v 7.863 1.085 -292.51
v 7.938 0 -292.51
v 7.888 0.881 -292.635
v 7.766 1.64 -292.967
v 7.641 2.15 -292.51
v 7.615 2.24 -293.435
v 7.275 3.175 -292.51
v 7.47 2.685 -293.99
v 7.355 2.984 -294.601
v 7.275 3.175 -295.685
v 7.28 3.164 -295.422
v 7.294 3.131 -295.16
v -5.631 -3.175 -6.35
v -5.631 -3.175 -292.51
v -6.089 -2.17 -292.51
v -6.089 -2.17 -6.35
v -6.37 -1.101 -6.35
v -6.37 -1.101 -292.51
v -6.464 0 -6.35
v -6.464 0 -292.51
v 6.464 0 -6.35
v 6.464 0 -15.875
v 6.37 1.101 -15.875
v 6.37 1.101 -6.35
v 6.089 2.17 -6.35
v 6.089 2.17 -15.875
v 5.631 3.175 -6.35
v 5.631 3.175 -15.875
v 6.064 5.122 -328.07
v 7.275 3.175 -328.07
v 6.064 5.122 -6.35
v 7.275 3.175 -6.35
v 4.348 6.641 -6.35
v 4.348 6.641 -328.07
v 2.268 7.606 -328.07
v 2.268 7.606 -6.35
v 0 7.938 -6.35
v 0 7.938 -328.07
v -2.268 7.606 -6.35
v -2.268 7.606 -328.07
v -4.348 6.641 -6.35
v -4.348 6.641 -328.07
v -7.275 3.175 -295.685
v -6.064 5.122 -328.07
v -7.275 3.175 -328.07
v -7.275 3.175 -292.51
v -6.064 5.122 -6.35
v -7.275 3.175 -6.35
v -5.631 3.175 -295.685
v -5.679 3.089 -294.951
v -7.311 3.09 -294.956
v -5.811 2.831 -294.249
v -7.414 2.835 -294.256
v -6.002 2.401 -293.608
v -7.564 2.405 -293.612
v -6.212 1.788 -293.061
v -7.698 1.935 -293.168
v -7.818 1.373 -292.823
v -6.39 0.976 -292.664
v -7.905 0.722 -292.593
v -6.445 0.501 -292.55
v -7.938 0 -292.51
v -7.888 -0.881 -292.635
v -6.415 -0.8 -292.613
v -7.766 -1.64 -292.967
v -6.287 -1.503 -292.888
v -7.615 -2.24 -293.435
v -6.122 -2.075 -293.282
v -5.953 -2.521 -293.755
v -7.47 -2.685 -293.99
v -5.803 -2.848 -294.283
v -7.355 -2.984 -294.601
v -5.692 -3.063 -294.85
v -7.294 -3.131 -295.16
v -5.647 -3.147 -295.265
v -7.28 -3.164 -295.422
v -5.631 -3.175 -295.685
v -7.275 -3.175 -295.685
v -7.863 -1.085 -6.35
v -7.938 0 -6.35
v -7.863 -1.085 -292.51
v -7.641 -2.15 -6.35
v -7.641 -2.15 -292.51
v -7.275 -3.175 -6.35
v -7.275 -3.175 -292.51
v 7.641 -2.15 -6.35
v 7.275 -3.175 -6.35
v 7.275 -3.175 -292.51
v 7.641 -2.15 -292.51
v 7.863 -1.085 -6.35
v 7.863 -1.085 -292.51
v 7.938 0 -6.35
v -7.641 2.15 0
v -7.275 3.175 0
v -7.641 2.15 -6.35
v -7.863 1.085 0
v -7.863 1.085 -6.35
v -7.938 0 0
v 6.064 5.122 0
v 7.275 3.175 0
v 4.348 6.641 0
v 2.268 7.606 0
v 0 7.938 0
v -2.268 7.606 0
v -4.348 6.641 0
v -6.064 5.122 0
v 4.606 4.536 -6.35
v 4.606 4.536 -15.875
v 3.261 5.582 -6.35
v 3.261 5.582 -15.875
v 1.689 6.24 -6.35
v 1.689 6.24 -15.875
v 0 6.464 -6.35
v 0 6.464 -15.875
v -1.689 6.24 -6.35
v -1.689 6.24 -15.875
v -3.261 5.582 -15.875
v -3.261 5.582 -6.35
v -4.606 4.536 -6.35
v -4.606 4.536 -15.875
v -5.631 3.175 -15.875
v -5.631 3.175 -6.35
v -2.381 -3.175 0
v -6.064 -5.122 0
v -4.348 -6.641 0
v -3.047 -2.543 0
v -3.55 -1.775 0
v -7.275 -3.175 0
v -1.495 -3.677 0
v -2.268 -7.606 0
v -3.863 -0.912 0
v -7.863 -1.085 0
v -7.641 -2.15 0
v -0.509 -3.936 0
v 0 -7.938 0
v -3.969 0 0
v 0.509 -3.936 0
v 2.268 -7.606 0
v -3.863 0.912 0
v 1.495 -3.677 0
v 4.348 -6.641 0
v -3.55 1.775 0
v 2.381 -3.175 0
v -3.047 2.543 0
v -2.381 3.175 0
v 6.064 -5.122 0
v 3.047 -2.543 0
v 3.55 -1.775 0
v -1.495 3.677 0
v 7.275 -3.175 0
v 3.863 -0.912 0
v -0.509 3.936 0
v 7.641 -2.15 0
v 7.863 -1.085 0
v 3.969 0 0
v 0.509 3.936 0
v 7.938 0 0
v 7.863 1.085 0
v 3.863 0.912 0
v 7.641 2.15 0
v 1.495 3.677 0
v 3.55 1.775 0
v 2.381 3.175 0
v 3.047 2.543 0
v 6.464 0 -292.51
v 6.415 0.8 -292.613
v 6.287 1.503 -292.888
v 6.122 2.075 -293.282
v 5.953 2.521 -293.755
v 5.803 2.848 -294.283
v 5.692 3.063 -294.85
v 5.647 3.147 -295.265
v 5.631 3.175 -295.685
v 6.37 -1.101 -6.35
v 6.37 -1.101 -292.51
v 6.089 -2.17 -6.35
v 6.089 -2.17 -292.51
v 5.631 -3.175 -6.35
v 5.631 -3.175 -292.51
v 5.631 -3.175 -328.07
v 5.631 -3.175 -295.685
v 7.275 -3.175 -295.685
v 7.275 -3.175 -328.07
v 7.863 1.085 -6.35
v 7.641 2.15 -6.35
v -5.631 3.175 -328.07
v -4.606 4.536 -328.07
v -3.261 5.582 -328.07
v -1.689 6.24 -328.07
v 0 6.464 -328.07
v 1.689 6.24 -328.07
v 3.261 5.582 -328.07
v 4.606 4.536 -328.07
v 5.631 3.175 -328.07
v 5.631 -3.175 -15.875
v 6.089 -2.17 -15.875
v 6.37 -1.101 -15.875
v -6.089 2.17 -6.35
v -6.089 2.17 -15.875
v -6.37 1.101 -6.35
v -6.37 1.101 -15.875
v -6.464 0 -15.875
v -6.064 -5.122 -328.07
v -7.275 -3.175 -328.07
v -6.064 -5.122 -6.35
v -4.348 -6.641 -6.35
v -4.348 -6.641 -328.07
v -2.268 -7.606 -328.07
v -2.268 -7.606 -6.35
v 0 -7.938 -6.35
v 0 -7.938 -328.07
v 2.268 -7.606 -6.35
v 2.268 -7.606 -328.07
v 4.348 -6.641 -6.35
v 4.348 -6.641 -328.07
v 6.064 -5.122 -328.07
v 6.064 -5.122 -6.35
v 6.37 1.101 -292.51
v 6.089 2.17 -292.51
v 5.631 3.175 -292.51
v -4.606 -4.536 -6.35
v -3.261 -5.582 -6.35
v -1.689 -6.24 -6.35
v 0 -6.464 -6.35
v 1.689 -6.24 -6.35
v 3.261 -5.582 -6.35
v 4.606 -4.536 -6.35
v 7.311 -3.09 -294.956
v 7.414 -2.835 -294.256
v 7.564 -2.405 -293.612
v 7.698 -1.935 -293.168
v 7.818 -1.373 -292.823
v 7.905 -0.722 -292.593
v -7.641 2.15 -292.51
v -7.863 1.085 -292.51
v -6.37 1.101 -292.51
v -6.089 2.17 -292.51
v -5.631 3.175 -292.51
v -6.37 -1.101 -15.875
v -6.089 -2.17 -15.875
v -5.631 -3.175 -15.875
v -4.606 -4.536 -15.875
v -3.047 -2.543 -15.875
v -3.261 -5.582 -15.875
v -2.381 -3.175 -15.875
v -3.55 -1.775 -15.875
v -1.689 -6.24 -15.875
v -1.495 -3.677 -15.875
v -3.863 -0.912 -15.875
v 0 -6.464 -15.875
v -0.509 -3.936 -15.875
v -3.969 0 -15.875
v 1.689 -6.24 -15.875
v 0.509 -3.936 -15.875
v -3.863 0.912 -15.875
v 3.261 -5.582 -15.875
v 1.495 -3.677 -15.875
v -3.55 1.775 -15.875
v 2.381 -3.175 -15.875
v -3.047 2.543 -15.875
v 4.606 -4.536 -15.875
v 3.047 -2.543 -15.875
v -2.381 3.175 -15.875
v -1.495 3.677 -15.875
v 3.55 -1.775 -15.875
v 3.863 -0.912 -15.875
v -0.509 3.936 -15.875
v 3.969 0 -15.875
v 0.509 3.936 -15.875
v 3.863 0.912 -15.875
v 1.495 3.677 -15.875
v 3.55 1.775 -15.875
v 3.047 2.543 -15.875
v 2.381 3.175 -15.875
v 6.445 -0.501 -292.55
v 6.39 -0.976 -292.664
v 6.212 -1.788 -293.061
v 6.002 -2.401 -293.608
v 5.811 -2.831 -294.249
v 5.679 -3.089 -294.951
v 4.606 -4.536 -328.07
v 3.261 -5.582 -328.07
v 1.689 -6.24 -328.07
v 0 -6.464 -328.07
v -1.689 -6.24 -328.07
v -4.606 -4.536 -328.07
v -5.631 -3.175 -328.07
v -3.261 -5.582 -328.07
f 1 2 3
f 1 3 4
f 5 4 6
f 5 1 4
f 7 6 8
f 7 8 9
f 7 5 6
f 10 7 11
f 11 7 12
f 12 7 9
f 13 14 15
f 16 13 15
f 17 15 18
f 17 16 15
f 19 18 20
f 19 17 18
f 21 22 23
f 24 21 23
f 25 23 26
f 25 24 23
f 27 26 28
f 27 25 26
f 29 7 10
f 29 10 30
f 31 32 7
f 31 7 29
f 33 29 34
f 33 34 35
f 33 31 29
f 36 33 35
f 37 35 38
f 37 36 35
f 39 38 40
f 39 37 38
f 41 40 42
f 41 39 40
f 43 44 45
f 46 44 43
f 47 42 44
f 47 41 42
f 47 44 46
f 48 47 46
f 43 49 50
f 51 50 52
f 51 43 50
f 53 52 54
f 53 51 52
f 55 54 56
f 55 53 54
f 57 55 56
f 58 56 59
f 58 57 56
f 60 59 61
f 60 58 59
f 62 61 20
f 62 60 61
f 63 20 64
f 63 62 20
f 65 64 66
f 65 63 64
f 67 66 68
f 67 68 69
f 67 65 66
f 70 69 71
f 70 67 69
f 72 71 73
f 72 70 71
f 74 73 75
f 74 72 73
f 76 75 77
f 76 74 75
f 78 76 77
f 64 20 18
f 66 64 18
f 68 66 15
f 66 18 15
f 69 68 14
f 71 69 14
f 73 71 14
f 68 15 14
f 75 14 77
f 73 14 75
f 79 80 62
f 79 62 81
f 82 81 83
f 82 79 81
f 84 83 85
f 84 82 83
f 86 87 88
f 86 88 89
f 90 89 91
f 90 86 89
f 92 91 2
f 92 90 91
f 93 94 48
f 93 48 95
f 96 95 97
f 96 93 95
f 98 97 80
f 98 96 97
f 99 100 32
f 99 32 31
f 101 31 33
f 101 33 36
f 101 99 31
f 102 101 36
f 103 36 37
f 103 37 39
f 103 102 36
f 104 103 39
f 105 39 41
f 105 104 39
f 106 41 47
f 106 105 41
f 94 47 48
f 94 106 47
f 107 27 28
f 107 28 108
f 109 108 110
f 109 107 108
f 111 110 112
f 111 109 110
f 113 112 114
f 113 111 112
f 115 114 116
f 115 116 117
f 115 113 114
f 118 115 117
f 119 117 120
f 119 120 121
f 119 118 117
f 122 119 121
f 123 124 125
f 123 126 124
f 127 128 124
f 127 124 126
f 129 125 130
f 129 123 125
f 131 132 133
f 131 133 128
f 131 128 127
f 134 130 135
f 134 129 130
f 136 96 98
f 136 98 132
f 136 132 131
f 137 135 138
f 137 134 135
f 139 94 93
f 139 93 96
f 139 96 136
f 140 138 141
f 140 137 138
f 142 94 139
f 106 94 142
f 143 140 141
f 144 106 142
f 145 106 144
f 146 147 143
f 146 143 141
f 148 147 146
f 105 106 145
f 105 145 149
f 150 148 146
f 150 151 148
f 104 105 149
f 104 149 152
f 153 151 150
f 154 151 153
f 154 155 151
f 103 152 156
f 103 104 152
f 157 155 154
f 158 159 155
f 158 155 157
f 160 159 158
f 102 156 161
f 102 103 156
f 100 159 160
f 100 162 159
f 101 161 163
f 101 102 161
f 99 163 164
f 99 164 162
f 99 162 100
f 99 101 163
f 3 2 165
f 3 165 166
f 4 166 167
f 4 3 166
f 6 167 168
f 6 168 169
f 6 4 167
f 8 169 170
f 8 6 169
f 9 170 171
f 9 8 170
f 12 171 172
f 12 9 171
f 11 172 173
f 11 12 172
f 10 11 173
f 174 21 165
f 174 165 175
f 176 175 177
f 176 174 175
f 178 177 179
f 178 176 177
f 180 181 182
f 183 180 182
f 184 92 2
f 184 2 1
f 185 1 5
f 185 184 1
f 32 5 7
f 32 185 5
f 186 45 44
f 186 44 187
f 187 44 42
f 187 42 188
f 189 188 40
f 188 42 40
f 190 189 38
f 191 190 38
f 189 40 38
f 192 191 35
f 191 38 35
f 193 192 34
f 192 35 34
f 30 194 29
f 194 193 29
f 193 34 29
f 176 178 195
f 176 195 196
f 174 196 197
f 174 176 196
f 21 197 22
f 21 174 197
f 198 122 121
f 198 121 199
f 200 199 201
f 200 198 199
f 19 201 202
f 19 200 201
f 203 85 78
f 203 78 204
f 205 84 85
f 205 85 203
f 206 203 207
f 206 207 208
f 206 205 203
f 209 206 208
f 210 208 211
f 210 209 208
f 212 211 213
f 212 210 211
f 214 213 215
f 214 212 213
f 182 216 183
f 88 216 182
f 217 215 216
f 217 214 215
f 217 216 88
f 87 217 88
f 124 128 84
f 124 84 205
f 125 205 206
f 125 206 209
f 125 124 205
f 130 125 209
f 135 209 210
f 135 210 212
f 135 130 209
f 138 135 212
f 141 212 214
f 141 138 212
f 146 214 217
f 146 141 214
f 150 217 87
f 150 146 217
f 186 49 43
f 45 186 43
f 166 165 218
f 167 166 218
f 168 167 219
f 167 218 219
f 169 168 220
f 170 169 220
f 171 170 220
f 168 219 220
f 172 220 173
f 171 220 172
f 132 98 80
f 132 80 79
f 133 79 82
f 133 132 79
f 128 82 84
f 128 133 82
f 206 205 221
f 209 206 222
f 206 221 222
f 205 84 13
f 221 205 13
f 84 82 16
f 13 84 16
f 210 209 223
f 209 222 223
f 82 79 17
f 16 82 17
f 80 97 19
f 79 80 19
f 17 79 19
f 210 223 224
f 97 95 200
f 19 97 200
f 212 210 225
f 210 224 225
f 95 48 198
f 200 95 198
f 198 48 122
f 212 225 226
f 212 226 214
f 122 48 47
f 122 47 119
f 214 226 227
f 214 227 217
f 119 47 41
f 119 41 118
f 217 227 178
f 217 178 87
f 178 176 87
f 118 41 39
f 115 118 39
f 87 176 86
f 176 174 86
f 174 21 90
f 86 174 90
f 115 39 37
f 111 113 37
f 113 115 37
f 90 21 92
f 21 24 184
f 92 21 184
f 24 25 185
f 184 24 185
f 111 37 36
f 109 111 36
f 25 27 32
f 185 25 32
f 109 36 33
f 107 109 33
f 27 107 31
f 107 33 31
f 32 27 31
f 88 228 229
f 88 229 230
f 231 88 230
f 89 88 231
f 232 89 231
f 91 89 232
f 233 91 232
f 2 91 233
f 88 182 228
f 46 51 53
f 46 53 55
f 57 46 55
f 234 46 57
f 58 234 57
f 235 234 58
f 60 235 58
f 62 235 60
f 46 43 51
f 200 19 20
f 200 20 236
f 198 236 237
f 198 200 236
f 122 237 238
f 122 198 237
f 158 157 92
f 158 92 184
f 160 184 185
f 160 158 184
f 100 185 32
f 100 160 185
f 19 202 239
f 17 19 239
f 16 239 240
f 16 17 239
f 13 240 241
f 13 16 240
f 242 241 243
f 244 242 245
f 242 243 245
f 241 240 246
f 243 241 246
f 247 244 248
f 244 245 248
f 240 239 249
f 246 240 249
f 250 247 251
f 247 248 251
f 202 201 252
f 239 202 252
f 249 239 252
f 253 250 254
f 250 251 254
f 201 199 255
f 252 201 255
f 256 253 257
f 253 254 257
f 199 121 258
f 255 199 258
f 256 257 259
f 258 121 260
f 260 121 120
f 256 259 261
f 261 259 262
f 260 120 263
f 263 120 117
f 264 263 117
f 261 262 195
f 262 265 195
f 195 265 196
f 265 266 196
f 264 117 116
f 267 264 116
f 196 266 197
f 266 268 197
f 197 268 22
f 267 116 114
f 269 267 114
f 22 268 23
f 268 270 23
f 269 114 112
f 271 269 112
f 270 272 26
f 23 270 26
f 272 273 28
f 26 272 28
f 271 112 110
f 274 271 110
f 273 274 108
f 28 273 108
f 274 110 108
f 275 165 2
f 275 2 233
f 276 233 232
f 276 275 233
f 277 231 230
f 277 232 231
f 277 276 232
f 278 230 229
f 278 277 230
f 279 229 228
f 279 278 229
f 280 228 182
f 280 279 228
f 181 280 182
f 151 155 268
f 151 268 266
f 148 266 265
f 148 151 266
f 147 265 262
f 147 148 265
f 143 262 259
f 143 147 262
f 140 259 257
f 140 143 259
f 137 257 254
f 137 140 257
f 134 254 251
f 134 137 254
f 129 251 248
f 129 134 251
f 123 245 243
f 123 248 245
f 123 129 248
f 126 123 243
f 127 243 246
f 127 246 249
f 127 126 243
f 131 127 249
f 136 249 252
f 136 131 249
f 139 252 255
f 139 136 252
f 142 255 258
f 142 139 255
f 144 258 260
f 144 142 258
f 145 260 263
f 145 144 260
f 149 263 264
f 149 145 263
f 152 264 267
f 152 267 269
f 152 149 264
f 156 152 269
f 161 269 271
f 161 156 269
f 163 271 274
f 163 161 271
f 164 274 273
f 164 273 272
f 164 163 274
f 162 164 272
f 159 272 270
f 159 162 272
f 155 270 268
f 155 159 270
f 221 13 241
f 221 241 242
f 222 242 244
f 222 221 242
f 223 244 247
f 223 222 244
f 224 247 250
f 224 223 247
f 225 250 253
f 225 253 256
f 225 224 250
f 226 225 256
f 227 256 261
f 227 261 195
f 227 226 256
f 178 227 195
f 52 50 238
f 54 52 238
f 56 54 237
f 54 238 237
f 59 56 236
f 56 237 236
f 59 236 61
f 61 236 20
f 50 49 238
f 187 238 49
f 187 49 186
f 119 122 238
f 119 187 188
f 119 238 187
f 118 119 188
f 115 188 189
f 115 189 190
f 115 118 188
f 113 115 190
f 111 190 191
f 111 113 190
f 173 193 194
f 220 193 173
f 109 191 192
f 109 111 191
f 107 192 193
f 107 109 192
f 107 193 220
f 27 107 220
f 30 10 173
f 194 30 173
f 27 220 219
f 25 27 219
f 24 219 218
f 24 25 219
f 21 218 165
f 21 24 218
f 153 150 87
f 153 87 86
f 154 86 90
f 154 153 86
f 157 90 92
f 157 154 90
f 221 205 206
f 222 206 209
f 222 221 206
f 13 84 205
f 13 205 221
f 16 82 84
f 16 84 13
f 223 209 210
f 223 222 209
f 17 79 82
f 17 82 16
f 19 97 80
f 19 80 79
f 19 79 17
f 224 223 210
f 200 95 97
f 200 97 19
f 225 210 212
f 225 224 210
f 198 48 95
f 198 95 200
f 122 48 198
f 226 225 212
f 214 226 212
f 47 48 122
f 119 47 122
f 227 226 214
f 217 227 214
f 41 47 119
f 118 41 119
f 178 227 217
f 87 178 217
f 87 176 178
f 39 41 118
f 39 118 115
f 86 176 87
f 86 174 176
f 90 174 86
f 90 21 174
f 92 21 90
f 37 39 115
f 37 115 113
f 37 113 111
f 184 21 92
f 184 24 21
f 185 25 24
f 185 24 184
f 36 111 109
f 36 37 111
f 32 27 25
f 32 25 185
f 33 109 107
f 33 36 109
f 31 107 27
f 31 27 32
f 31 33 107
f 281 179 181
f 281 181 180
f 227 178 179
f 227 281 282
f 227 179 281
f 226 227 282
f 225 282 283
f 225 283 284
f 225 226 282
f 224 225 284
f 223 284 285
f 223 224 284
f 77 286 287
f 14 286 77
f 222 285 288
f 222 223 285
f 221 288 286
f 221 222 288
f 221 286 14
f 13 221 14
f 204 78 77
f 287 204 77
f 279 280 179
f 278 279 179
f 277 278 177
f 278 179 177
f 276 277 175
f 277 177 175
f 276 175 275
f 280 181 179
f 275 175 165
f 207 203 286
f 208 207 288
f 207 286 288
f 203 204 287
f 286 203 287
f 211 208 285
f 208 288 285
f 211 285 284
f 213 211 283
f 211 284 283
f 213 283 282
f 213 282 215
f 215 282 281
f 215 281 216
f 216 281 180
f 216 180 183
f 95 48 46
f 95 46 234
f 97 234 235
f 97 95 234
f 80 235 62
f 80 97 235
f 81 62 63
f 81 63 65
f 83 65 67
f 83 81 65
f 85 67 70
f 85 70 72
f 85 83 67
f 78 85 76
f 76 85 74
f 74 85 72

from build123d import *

# Parameters (mm, degrees)
THREADED_INSERT_1_1_DEPTH = 6.35
THREADED_START            = -6.35
THREADED_INSERT_1_2_DEPTH = 9.525
A_ARM_START               = -6.35
A_ARM_TUBE_DEPTH          = 321.72025
APEX_START                = -292.51025
APEX_SLOT_DEPTH           = 35.56
FILLET1_R                 = 3.175


with BuildPart() as part:
    # Sketch1 → Threaded insert 1-1 (new body)
    with BuildSketch(Plane.XY):
        with BuildLine():
            ThreePointArc((-2.38125, 3.175), (0, 3.96875), (2.38125, 3.175))
            Line((2.38125, 3.175), (5.630856905, 3.175))
            ThreePointArc((5.630856905, 3.175), (0, 6.4643), (-5.630856905, 3.175))
            Line((-5.630856905, 3.175), (-2.38125, 3.175))
        make_face()
        with BuildLine():
            ThreePointArc((-5.630856905, 3.175), (0, 6.4643), (5.630856905, 3.175))
            Line((5.630856905, 3.175), (7.274838916, 3.175))
            ThreePointArc((7.274838916, 3.175), (0, 7.9375), (-7.274838916, 3.175))
            Line((-7.274838916, 3.175), (-5.630856905, 3.175))
        make_face()
        with BuildLine():
            ThreePointArc((2.38125, 3.175), (3.549757914, 1.774878957), (3.96875, 0))
            Line((3.96875, 0), (6.4643, 0))
            ThreePointArc((6.4643, 0), (6.252468424, 1.641283978), (5.630856905, 3.175))
            Line((5.630856905, 3.175), (2.38125, 3.175))
        make_face()
        with BuildLine():
            Line((-6.4643, 0), (-3.96875, 0))
            ThreePointArc((-3.96875, 0), (-3.549757914, 1.774878957), (-2.38125, 3.175))
            Line((-2.38125, 3.175), (-5.630856905, 3.175))
            ThreePointArc((-5.630856905, 3.175), (-6.252468424, 1.641283978), (-6.4643, 0))
        make_face()
        with BuildLine():
            ThreePointArc((5.630856905, 3.175), (6.252468424, 1.641283978), (6.4643, 0))
            Line((6.4643, 0), (7.9375, 0))
            ThreePointArc((7.9375, 0), (7.770068859, 1.621707797), (7.274838916, 3.175))
            Line((7.274838916, 3.175), (5.630856905, 3.175))
        make_face()
        with BuildLine():
            Line((-7.9375, 0), (-6.4643, 0))
            ThreePointArc((-6.4643, 0), (-6.252468424, 1.641283978), (-5.630856905, 3.175))
            Line((-5.630856905, 3.175), (-7.274838916, 3.175))
            ThreePointArc((-7.274838916, 3.175), (-7.770068859, 1.621707797), (-7.9375, 0))
        make_face()
        with BuildLine():
            Line((7.9375, 0), (6.4643, 0))
            ThreePointArc((6.4643, 0), (6.252468424, -1.641283978), (5.630856905, -3.175))
            Line((5.630856905, -3.175), (7.274838916, -3.175))
            ThreePointArc((7.274838916, -3.175), (7.770068859, -1.621707797), (7.9375, 0))
        make_face()
        with BuildLine():
            ThreePointArc((-5.630856905, -3.175), (-6.252468424, -1.641283978), (-6.4643, 0))
            Line((-6.4643, 0), (-7.9375, 0))
            ThreePointArc((-7.9375, 0), (-7.770068859, -1.621707797), (-7.274838916, -3.175))
            Line((-7.274838916, -3.175), (-5.630856905, -3.175))
        make_face()
        with BuildLine():
            Line((6.4643, 0), (3.96875, 0))
            ThreePointArc((3.96875, 0), (3.549757914, -1.774878957), (2.38125, -3.175))
            Line((2.38125, -3.175), (5.630856905, -3.175))
            ThreePointArc((5.630856905, -3.175), (6.252468424, -1.641283978), (6.4643, 0))
        make_face()
        with BuildLine():
            ThreePointArc((-2.38125, -3.175), (-3.549757914, -1.774878957), (-3.96875, 0))
            Line((-3.96875, 0), (-6.4643, 0))
            ThreePointArc((-6.4643, 0), (-6.252468424, -1.641283978), (-5.630856905, -3.175))
            Line((-5.630856905, -3.175), (-2.38125, -3.175))
        make_face()
        with BuildLine():
            Line((5.630856905, -3.175), (2.38125, -3.175))
            ThreePointArc((2.38125, -3.175), (0, -3.96875), (-2.38125, -3.175))
            Line((-2.38125, -3.175), (-5.630856905, -3.175))
            ThreePointArc((-5.630856905, -3.175), (0, -6.4643), (5.630856905, -3.175))
        make_face()
        with BuildLine():
            Line((7.274838916, -3.175), (5.630856905, -3.175))
            ThreePointArc((5.630856905, -3.175), (0, -6.4643), (-5.630856905, -3.175))
            Line((-5.630856905, -3.175), (-7.274838916, -3.175))
            ThreePointArc((-7.274838916, -3.175), (0, -7.9375), (7.274838916, -3.175))
        make_face()
    extrude(amount=-THREADED_INSERT_1_1_DEPTH)

    # Sketch1<3> → Threaded insert 1-2 (add)
    with BuildSketch(Plane.XY.offset(THREADED_START)):
        with BuildLine():
            ThreePointArc((-2.38125, 3.175), (0, 3.96875), (2.38125, 3.175))
            Line((2.38125, 3.175), (5.630856905, 3.175))
            ThreePointArc((5.630856905, 3.175), (0, 6.4643), (-5.630856905, 3.175))
            Line((-5.630856905, 3.175), (-2.38125, 3.175))
        make_face()
        with BuildLine():
            ThreePointArc((2.38125, 3.175), (3.549757914, 1.774878957), (3.96875, 0))
            Line((3.96875, 0), (6.4643, 0))
            ThreePointArc((6.4643, 0), (6.252468424, 1.641283978), (5.630856905, 3.175))
            Line((5.630856905, 3.175), (2.38125, 3.175))
        make_face()
        with BuildLine():
            Line((-6.4643, 0), (-3.96875, 0))
            ThreePointArc((-3.96875, 0), (-3.549757914, 1.774878957), (-2.38125, 3.175))
            Line((-2.38125, 3.175), (-5.630856905, 3.175))
            ThreePointArc((-5.630856905, 3.175), (-6.252468424, 1.641283978), (-6.4643, 0))
        make_face()
        with BuildLine():
            Line((6.4643, 0), (3.96875, 0))
            ThreePointArc((3.96875, 0), (3.549757914, -1.774878957), (2.38125, -3.175))
            Line((2.38125, -3.175), (5.630856905, -3.175))
            ThreePointArc((5.630856905, -3.175), (6.252468424, -1.641283978), (6.4643, 0))
        make_face()
        with BuildLine():
            ThreePointArc((-2.38125, -3.175), (-3.549757914, -1.774878957), (-3.96875, 0))
            Line((-3.96875, 0), (-6.4643, 0))
            ThreePointArc((-6.4643, 0), (-6.252468424, -1.641283978), (-5.630856905, -3.175))
            Line((-5.630856905, -3.175), (-2.38125, -3.175))
        make_face()
        with BuildLine():
            Line((5.630856905, -3.175), (2.38125, -3.175))
            ThreePointArc((2.38125, -3.175), (0, -3.96875), (-2.38125, -3.175))
            Line((-2.38125, -3.175), (-5.630856905, -3.175))
            ThreePointArc((-5.630856905, -3.175), (0, -6.4643), (5.630856905, -3.175))
        make_face()
    extrude(amount=-THREADED_INSERT_1_2_DEPTH)


with BuildPart() as body_2:
    # Sketch1<4> → A-arm tube (new body)
    with BuildSketch(Plane.XY.offset(A_ARM_START)):
        with BuildLine():
            ThreePointArc((-5.630856905, 3.175), (0, 6.4643), (5.630856905, 3.175))
            Line((5.630856905, 3.175), (7.274838916, 3.175))
            ThreePointArc((7.274838916, 3.175), (0, 7.9375), (-7.274838916, 3.175))
            Line((-7.274838916, 3.175), (-5.630856905, 3.175))
        make_face()
        with BuildLine():
            ThreePointArc((5.630856905, 3.175), (6.252468424, 1.641283978), (6.4643, 0))
            Line((6.4643, 0), (7.9375, 0))
            ThreePointArc((7.9375, 0), (7.770068859, 1.621707797), (7.274838916, 3.175))
            Line((7.274838916, 3.175), (5.630856905, 3.175))
        make_face()
        with BuildLine():
            Line((-7.9375, 0), (-6.4643, 0))
            ThreePointArc((-6.4643, 0), (-6.252468424, 1.641283978), (-5.630856905, 3.175))
            Line((-5.630856905, 3.175), (-7.274838916, 3.175))
            ThreePointArc((-7.274838916, 3.175), (-7.770068859, 1.621707797), (-7.9375, 0))
        make_face()
        with BuildLine():
            Line((7.9375, 0), (6.4643, 0))
            ThreePointArc((6.4643, 0), (6.252468424, -1.641283978), (5.630856905, -3.175))
            Line((5.630856905, -3.175), (7.274838916, -3.175))
            ThreePointArc((7.274838916, -3.175), (7.770068859, -1.621707797), (7.9375, 0))
        make_face()
        with BuildLine():
            ThreePointArc((-5.630856905, -3.175), (-6.252468424, -1.641283978), (-6.4643, 0))
            Line((-6.4643, 0), (-7.9375, 0))
            ThreePointArc((-7.9375, 0), (-7.770068859, -1.621707797), (-7.274838916, -3.175))
            Line((-7.274838916, -3.175), (-5.630856905, -3.175))
        make_face()
        with BuildLine():
            Line((7.274838916, -3.175), (5.630856905, -3.175))
            ThreePointArc((5.630856905, -3.175), (0, -6.4643), (-5.630856905, -3.175))
            Line((-5.630856905, -3.175), (-7.274838916, -3.175))
            ThreePointArc((-7.274838916, -3.175), (0, -7.9375), (7.274838916, -3.175))
        make_face()
    extrude(amount=-A_ARM_TUBE_DEPTH)

    # Sketch1<5> → Apex slot (cut)
    with BuildSketch(Plane.XY.offset(APEX_START)):
        with BuildLine():
            ThreePointArc((5.630856905, 3.175), (6.252468424, 1.641283978), (6.4643, 0))
            Line((6.4643, 0), (7.9375, 0))
            ThreePointArc((7.9375, 0), (7.770068859, 1.621707797), (7.274838916, 3.175))
            Line((7.274838916, 3.175), (5.630856905, 3.175))
        make_face()
        with BuildLine():
            Line((-7.9375, 0), (-6.4643, 0))
            ThreePointArc((-6.4643, 0), (-6.252468424, 1.641283978), (-5.630856905, 3.175))
            Line((-5.630856905, 3.175), (-7.274838916, 3.175))
            ThreePointArc((-7.274838916, 3.175), (-7.770068859, 1.621707797), (-7.9375, 0))
        make_face()
        with BuildLine():
            Line((7.9375, 0), (6.4643, 0))
            ThreePointArc((6.4643, 0), (6.252468424, -1.641283978), (5.630856905, -3.175))
            Line((5.630856905, -3.175), (7.274838916, -3.175))
            ThreePointArc((7.274838916, -3.175), (7.770068859, -1.621707797), (7.9375, 0))
        make_face()
        with BuildLine():
            ThreePointArc((-5.630856905, -3.175), (-6.252468424, -1.641283978), (-6.4643, 0))
            Line((-6.4643, 0), (-7.9375, 0))
            ThreePointArc((-7.9375, 0), (-7.770068859, -1.621707797), (-7.274838916, -3.175))
            Line((-7.274838916, -3.175), (-5.630856905, -3.175))
        make_face()
    extrude(amount=-APEX_SLOT_DEPTH, mode=Mode.SUBTRACT)

    # Fillet1
    # the kernel refuses this fillet: 3.175 mm, written as the material it adds along each edge
    with BuildSketch(Plane(origin=(2.306643095, 3.175, -292.51025), x_dir=(0, 0, -1), z_dir=(-1, 0, 0))) as fillet1_piece_1_section:
        with BuildLine():
            CenterArc((FILLET1_R, FILLET1_R), FILLET1_R, 180, 90)
            Line((0, FILLET1_R), (0, 0))
            Line((0, 0), (FILLET1_R, 0))
        make_face()
    fillet1_piece_1 = extrude(amount=17.51898201, mode=Mode.PRIVATE)
    fillet1_piece_1 = fillet1_piece_1 - Plane(origin=(0, 0, -293.22998262), x_dir=(-0.8710698614669244, 0.49115913555994567, 0), z_dir=(0, 0, 1)) * Cylinder(6.4643, 48, mode=Mode.PRIVATE)
    fillet1_piece_1 = fillet1_piece_1 & Plane(origin=(0, 0, -293.22998262), x_dir=(-1, 0, 0), z_dir=(0, 0, 1)) * Cylinder(7.9375, 48, mode=Mode.PRIVATE)
    add(fillet1_piece_1)
    with BuildSketch(Plane(origin=(-15.212338916, -3.175, -292.51025), x_dir=(0, 0, -1), z_dir=(1, 0, 0))) as fillet1_piece_2_section:
        with BuildLine():
            CenterArc((FILLET1_R, FILLET1_R), FILLET1_R, 180, 90)
            Line((0, FILLET1_R), (0, 0))
            Line((0, 0), (FILLET1_R, 0))
        make_face()
    fillet1_piece_2 = extrude(amount=17.51898201, mode=Mode.PRIVATE)
    fillet1_piece_2 = fillet1_piece_2 - Plane(origin=(0, 0, -293.229982783), x_dir=(-0.8710698614669244, 0.49115913555994567, 0), z_dir=(0, 0, 1)) * Cylinder(6.4643, 48, mode=Mode.PRIVATE)
    fillet1_piece_2 = fillet1_piece_2 & Plane(origin=(0, 0, -293.229982783), x_dir=(-1, 0, 0), z_dir=(0, 0, 1)) * Cylinder(7.9375, 48, mode=Mode.PRIVATE)
    add(fillet1_piece_2)
    with BuildSketch(Plane(origin=(-2.306643095, -3.175, -292.51025), x_dir=(0, 0, -1), z_dir=(1, 0, 0))) as fillet1_piece_3_section:
        with BuildLine():
            CenterArc((FILLET1_R, FILLET1_R), FILLET1_R, 180, 90)
            Line((0, FILLET1_R), (0, 0))
            Line((0, 0), (FILLET1_R, 0))
        make_face()
    fillet1_piece_3 = extrude(amount=17.51898201, mode=Mode.PRIVATE)
    fillet1_piece_3 = fillet1_piece_3 - Plane(origin=(0, 0, -293.22998262), x_dir=(-0.8710698614669244, 0.49115913555994567, 0), z_dir=(0, 0, 1)) * Cylinder(6.4643, 48, mode=Mode.PRIVATE)
    fillet1_piece_3 = fillet1_piece_3 & Plane(origin=(0, 0, -293.22998262), x_dir=(-1, 0, 0), z_dir=(0, 0, 1)) * Cylinder(7.9375, 48, mode=Mode.PRIVATE)
    add(fillet1_piece_3)
    with BuildSketch(Plane(origin=(15.212338916, 3.175, -292.51025), x_dir=(0, -1, 0), z_dir=(-1, 0, 0))) as fillet1_piece_4_section:
        with BuildLine():
            CenterArc((FILLET1_R, -FILLET1_R), FILLET1_R, 90, 90)
            Line((0, -FILLET1_R), (0, 0))
            Line((0, 0), (FILLET1_R, 0))
        make_face()
    fillet1_piece_4 = extrude(amount=17.51898201, mode=Mode.PRIVATE)
    fillet1_piece_4 = fillet1_piece_4 - Plane(origin=(0, 0, -293.229982609), x_dir=(-0.8710698614669244, 0.49115913555994567, 0), z_dir=(0, 0, 1)) * Cylinder(6.4643, 48, mode=Mode.PRIVATE)
    fillet1_piece_4 = fillet1_piece_4 & Plane(origin=(0, 0, -293.229982609), x_dir=(-1, 0, 0), z_dir=(0, 0, 1)) * Cylinder(7.9375, 48, mode=Mode.PRIVATE)
    add(fillet1_piece_4)


solid = Compound([part.part, body_2.part])
